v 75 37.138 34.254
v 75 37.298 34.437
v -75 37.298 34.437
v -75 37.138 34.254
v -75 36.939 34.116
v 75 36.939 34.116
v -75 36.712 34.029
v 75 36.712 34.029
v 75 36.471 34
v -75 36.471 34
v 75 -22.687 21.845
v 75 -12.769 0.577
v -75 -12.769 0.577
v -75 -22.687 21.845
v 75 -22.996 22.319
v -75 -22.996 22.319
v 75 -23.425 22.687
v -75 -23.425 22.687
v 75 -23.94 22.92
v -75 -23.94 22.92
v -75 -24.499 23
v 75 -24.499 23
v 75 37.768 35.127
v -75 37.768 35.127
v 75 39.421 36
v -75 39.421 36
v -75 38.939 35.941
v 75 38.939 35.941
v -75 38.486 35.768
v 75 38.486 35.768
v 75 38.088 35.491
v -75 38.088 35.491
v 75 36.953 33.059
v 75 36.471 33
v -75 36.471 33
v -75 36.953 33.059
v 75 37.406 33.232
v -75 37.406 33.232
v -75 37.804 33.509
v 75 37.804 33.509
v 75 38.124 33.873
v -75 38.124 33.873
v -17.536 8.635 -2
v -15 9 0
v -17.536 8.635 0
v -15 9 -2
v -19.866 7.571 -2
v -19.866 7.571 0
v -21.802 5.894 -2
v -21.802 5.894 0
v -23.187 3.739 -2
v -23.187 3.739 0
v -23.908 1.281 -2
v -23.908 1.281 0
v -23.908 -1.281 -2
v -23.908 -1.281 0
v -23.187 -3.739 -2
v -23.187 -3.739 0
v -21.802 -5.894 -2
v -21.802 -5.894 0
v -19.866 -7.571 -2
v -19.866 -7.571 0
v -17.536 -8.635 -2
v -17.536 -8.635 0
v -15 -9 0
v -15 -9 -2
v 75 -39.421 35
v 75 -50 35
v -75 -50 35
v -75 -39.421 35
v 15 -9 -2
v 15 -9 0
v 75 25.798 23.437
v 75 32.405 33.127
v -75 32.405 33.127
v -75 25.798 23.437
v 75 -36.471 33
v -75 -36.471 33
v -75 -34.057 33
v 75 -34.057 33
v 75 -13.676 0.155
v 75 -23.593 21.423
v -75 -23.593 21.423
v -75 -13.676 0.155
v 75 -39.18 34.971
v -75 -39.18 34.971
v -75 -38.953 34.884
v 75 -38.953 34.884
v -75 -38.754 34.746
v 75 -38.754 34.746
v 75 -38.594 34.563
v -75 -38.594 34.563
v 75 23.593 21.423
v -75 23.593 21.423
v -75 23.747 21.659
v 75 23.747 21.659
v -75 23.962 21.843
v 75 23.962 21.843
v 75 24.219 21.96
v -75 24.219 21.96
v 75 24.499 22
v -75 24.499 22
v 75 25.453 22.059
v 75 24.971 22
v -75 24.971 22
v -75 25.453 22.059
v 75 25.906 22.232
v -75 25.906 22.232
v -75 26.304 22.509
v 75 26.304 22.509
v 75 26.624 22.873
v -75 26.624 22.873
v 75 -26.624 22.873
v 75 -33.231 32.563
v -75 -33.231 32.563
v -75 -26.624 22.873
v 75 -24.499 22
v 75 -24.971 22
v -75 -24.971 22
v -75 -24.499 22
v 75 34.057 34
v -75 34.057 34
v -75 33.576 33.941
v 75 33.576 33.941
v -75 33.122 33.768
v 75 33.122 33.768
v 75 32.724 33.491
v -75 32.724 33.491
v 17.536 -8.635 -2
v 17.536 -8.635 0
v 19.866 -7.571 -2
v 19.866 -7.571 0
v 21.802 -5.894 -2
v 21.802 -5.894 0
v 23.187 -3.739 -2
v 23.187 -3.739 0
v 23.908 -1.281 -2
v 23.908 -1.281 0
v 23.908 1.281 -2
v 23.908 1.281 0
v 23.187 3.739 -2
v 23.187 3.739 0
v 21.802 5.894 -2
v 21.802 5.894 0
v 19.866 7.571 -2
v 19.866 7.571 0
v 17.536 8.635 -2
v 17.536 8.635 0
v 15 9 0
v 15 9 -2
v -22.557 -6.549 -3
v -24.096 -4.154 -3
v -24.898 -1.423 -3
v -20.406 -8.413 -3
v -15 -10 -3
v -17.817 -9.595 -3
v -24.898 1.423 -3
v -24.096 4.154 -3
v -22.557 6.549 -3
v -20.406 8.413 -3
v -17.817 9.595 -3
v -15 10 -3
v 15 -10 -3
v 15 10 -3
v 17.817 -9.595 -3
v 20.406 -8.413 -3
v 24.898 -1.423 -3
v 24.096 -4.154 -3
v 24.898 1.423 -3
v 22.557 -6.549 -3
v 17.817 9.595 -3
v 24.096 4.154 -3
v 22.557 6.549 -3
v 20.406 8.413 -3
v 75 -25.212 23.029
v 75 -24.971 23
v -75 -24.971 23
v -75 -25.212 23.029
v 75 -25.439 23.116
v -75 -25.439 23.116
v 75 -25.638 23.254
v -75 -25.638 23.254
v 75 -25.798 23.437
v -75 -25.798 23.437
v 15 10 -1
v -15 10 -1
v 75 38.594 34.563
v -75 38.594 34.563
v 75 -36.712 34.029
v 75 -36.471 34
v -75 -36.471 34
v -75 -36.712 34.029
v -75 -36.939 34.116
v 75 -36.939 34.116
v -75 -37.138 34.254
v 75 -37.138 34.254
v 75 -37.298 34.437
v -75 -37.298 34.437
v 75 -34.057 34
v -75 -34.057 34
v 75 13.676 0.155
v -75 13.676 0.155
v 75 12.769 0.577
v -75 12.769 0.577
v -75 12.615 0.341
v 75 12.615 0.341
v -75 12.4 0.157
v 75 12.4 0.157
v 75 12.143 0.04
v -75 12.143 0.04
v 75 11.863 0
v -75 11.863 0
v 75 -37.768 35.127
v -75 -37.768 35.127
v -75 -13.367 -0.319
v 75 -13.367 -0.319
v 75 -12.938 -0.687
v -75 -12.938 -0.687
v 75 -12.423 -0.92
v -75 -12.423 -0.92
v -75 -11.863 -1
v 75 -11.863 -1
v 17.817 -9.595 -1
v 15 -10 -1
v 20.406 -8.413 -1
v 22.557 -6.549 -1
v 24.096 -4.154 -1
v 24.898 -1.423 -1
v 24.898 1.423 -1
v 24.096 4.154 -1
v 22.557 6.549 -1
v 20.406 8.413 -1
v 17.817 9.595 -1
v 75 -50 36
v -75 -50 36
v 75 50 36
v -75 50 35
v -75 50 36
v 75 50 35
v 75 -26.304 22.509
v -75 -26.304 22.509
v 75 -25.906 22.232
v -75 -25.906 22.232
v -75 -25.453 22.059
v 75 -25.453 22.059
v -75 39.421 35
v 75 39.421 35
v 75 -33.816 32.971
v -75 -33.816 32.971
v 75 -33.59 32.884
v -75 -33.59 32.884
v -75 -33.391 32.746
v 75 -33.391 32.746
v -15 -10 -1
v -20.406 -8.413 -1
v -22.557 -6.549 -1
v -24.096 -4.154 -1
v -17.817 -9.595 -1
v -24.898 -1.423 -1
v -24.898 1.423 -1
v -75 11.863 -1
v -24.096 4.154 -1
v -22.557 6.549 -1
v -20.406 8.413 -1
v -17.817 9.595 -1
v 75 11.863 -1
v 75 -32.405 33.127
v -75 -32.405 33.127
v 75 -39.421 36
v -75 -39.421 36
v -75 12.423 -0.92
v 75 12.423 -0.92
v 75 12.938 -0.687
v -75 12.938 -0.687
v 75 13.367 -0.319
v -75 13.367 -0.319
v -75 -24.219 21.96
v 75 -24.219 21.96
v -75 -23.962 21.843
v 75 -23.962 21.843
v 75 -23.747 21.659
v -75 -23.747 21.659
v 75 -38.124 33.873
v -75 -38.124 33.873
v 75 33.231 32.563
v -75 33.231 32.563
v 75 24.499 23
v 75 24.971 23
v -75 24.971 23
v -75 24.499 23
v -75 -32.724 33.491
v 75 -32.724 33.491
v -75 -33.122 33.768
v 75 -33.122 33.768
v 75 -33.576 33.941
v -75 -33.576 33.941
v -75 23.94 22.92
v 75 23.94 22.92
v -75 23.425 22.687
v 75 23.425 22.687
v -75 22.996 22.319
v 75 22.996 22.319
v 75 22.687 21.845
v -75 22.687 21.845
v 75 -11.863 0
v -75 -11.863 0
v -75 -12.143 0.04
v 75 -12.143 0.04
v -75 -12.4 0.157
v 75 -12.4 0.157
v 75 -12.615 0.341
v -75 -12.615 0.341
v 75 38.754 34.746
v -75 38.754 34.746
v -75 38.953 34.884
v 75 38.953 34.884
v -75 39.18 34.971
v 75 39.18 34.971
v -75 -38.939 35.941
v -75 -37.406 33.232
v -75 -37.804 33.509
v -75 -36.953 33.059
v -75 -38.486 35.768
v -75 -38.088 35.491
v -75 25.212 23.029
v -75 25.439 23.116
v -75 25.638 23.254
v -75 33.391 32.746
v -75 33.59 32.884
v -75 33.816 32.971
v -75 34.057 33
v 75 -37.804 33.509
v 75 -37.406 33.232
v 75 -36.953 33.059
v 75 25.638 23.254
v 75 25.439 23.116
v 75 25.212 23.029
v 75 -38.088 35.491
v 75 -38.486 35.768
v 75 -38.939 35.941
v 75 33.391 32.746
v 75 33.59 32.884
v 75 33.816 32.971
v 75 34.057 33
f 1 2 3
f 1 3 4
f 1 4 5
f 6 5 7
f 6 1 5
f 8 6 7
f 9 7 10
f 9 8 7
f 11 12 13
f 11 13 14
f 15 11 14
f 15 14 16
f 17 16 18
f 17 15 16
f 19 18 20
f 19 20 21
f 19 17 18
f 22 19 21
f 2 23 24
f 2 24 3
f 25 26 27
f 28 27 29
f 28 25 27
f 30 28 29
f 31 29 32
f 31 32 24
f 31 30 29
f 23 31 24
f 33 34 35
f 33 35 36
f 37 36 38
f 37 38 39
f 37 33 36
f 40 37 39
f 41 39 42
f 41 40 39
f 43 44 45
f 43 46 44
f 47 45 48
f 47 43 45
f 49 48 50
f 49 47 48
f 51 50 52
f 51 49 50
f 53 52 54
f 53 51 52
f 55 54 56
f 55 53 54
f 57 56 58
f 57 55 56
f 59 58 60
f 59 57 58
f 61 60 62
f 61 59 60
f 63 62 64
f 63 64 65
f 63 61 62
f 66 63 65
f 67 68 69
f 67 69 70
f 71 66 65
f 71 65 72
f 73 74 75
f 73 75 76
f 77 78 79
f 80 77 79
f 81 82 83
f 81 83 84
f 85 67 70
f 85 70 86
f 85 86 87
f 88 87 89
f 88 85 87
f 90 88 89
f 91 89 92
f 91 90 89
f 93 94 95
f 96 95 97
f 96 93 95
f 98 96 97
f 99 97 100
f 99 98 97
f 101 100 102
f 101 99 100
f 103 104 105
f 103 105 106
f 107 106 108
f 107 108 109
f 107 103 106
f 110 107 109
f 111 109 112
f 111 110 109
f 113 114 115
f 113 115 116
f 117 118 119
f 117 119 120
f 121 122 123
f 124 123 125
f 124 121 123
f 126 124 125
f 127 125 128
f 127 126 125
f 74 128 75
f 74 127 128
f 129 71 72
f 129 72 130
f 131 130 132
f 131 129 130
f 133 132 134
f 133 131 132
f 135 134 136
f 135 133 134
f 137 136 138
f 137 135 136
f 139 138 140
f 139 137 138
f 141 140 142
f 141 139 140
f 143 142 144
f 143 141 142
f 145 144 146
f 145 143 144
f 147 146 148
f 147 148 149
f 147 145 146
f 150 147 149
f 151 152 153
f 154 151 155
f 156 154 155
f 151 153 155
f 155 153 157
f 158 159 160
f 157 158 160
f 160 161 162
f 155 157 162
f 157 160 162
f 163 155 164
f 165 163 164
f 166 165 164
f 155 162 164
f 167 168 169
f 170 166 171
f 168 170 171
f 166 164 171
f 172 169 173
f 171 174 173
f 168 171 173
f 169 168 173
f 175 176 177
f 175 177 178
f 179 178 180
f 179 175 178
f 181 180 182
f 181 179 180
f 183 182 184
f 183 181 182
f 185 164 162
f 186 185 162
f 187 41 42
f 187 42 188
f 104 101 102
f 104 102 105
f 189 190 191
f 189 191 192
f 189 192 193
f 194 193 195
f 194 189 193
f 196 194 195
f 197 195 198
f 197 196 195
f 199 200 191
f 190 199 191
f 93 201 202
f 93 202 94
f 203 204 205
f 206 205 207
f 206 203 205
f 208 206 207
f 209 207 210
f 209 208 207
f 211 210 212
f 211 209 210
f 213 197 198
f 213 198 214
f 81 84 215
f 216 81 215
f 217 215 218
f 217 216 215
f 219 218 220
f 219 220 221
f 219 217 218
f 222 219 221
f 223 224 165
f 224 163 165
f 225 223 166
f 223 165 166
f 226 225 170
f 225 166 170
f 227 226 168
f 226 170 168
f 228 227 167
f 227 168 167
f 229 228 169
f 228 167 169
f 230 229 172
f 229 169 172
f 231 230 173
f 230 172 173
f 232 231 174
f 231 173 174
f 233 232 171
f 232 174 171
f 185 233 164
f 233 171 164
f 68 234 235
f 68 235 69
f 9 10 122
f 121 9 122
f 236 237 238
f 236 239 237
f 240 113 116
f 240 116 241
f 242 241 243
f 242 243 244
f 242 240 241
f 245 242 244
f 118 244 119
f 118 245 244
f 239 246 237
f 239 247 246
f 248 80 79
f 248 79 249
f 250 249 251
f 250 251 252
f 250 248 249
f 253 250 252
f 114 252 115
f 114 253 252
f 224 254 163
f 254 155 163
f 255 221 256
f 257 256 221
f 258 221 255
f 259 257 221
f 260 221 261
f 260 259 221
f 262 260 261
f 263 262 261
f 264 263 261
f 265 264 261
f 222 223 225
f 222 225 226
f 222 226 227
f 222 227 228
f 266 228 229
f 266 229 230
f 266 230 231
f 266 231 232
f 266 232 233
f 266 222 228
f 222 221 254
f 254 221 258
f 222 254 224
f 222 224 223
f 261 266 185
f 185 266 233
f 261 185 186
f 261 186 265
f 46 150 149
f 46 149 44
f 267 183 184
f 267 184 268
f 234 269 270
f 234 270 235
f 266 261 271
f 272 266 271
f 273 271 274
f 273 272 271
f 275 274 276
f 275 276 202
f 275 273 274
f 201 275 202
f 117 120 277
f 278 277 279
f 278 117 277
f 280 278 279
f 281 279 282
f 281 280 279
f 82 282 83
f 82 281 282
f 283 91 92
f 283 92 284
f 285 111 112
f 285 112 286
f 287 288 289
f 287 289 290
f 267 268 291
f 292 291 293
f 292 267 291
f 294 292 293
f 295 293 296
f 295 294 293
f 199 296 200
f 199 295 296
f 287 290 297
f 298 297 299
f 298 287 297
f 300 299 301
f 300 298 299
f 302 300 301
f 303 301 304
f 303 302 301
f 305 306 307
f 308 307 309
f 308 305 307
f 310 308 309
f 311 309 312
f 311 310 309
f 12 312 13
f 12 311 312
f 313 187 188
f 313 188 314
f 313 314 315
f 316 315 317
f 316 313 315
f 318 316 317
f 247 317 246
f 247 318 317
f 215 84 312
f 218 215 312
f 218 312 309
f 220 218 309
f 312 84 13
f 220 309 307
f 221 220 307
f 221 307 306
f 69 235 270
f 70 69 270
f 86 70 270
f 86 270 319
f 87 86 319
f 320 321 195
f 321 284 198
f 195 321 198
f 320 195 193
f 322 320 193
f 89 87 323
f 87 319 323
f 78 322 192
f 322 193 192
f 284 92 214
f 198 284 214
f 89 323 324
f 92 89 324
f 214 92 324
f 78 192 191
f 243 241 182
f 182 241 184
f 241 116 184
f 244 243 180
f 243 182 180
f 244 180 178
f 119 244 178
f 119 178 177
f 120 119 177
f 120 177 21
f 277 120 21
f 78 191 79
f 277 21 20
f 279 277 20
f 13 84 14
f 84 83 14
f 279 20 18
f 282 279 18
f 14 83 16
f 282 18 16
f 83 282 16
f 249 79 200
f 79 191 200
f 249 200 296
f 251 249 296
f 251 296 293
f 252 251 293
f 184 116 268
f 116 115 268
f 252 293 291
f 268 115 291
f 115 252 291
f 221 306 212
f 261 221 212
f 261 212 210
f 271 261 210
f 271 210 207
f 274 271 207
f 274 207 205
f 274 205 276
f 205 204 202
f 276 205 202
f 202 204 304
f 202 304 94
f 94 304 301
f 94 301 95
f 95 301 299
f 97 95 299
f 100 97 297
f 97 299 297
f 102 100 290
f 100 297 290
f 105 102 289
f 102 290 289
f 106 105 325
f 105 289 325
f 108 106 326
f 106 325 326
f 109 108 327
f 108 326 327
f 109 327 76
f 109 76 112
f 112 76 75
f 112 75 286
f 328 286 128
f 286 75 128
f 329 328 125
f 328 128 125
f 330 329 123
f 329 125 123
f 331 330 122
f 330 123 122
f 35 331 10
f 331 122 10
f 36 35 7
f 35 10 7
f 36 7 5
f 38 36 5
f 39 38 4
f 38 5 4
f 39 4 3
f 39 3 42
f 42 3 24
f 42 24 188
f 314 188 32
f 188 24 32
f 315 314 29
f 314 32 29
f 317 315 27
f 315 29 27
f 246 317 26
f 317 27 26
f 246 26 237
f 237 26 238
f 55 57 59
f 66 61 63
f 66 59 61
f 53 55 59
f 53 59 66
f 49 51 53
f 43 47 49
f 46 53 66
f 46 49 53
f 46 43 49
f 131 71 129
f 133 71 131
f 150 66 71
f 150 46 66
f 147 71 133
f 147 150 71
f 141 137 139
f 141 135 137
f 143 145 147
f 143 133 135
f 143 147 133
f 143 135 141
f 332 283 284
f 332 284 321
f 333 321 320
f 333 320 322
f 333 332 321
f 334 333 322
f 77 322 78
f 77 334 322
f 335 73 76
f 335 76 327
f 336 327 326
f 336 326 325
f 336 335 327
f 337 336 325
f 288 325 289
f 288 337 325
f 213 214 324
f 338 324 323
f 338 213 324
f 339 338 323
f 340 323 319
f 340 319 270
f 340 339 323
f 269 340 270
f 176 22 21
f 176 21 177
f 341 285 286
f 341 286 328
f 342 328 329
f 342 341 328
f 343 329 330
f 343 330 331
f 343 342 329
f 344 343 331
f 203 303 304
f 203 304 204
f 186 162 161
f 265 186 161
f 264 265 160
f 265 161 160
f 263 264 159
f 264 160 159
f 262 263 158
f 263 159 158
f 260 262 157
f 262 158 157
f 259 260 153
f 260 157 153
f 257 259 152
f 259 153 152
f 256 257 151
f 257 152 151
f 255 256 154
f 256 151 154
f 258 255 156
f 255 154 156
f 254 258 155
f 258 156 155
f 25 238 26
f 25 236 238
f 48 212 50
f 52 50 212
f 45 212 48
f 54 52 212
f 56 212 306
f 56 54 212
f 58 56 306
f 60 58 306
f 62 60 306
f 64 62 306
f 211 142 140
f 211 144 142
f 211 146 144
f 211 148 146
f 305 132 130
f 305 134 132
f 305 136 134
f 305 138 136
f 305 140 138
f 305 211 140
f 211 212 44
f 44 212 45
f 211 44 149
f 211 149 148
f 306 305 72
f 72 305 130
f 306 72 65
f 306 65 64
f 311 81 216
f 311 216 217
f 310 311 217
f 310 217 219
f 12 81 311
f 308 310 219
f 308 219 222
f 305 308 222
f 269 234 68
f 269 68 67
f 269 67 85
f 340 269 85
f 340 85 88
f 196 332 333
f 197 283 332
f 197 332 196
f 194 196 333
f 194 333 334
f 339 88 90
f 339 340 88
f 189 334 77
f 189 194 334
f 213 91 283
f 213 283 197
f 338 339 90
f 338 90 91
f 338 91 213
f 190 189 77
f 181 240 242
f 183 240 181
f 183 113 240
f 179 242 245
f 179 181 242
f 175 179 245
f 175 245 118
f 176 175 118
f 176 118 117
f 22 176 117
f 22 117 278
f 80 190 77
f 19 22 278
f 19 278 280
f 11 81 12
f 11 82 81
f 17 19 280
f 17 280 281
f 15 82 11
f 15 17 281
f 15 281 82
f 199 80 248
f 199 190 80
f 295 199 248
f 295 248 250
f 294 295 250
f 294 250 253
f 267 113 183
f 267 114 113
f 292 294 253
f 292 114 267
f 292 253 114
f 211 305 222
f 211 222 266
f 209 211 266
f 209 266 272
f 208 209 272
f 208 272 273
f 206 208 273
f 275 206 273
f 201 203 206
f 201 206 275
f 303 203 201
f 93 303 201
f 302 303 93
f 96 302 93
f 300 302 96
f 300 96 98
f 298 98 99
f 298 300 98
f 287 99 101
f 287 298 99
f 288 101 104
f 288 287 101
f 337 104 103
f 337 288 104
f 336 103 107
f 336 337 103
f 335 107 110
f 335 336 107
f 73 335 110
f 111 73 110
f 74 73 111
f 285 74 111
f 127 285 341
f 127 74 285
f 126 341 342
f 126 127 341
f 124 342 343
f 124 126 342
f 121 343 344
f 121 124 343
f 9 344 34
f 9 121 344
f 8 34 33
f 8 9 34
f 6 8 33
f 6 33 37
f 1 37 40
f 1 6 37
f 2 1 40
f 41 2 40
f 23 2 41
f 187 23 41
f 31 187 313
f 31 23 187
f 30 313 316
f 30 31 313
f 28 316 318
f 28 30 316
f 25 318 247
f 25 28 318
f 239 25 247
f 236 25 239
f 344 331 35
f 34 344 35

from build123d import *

# Parameters (mm, degrees)
BASE_FLANGE1_DEPTH         = 75
SHEET_START                = -1
SHEET_METAL_STAMP1_DEPTH   = 1
SHEET_START_2              = -3
SHEET_METAL_STAMP1_2_DEPTH = 1
SHEET_START_3              = -2
SHEET_METAL_STAMP1_3_DEPTH = 1


# Read off the part's stored shape, not the designer's step: Sheet Metal Stamp1
# Sheet-metal steps are written as plain solids
with BuildPart() as part:
    # Sketch1 → Base-Flange1 (new, symmetric)
    with BuildSketch(Plane.YZ):
        with BuildLine():
            Line((50, 36), (39.420641265, 36))
            ThreePointArc((39.420641265, 36), (38.486121949, 35.768240269), (37.768186579, 35.126673649))
            Line((37.768186579, 35.126673649), (37.297724892, 34.436663175))
            ThreePointArc((37.297724892, 34.436663175), (36.938757207, 34.115879865), (36.471497549, 34))
            Line((36.471497549, 34), (34.057004901, 34))
            ThreePointArc((34.057004901, 34), (33.122485586, 33.768240269), (32.404550215, 33.126673649))
            Line((32.404550215, 33.126673649), (25.797724892, 23.436663175))
            ThreePointArc((25.797724892, 23.436663175), (25.438757207, 23.115879865), (24.971497549, 23))
            Line((24.971497549, 23), (24.499216659, 23))
            ThreePointArc((24.499216659, 23), (23.424617442, 22.686782892), (22.686601085, 21.845236523))
            Line((22.686601085, 21.845236523), (12.769237526, 0.577381738))
            ThreePointArc((12.769237526, 0.577381738), (12.400229348, 0.156608554), (11.862929739, 0))
            Line((11.862929739, 0), (-11.862929739, 0))
            ThreePointArc((-11.862929739, 0), (-12.400229348, 0.156608554), (-12.769237526, 0.577381738))
            Line((-12.769237526, 0.577381738), (-22.686601085, 21.845236523))
            ThreePointArc((-22.686601085, 21.845236523), (-23.424617442, 22.686782892), (-24.499216659, 23))
            Line((-24.499216659, 23), (-24.971497549, 23))
            ThreePointArc((-24.971497549, 23), (-25.438757207, 23.115879865), (-25.797724892, 23.436663175))
            Line((-25.797724892, 23.436663175), (-32.404550215, 33.126673649))
            ThreePointArc((-32.404550215, 33.126673649), (-33.122485586, 33.768240269), (-34.057004901, 34))
            Line((-34.057004901, 34), (-36.471497549, 34))
            ThreePointArc((-36.471497549, 34), (-36.938757207, 34.115879865), (-37.297724892, 34.436663175))
            Line((-37.297724892, 34.436663175), (-37.768186579, 35.126673649))
            ThreePointArc((-37.768186579, 35.126673649), (-38.486121949, 35.768240269), (-39.420641265, 36))
            Line((-39.420641265, 36), (-50, 36))
            Line((-50, 36), (-50, 35))
            Line((-50, 35), (-39.420641265, 35))
            ThreePointArc((-39.420641265, 35), (-38.953381607, 34.884120135), (-38.594413922, 34.563336825))
            Line((-38.594413922, 34.563336825), (-38.123952235, 33.873326351))
            ThreePointArc((-38.123952235, 33.873326351), (-37.406016865, 33.231759731), (-36.471497549, 33))
            Line((-36.471497549, 33), (-34.057004901, 33))
            ThreePointArc((-34.057004901, 33), (-33.589745243, 32.884120135), (-33.230777558, 32.563336825))
            Line((-33.230777558, 32.563336825), (-26.623952235, 22.873326351))
            ThreePointArc((-26.623952235, 22.873326351), (-25.906016865, 22.231759731), (-24.971497549, 22))
            Line((-24.971497549, 22), (-24.499216659, 22))
            ThreePointArc((-24.499216659, 22), (-23.961917051, 21.843391446), (-23.592908872, 21.422618262))
            Line((-23.592908872, 21.422618262), (-13.675545313, 0.154763477))
            ThreePointArc((-13.675545313, 0.154763477), (-12.937528956, -0.686782892), (-11.862929739, -1))
            Line((-11.862929739, -1), (11.862929739, -1))
            ThreePointArc((11.862929739, -1), (12.937528956, -0.686782892), (13.675545313, 0.154763477))
            Line((13.675545313, 0.154763477), (23.592908872, 21.422618262))
            ThreePointArc((23.592908872, 21.422618262), (23.961917051, 21.843391446), (24.499216659, 22))
            Line((24.499216659, 22), (24.971497549, 22))
            ThreePointArc((24.971497549, 22), (25.906016865, 22.231759731), (26.623952235, 22.873326351))
            Line((26.623952235, 22.873326351), (33.230777558, 32.563336825))
            ThreePointArc((33.230777558, 32.563336825), (33.589745243, 32.884120135), (34.057004901, 33))
            Line((34.057004901, 33), (36.471497549, 33))
            ThreePointArc((36.471497549, 33), (37.406016865, 33.231759731), (38.123952235, 33.873326351))
            Line((38.123952235, 33.873326351), (38.594413922, 34.563336825))
            ThreePointArc((38.594413922, 34.563336825), (38.953381607, 34.884120135), (39.420641265, 35))
            Line((39.420641265, 35), (50, 35))
            Line((50, 35), (50, 36))
        make_face()
    extrude(amount=BASE_FLANGE1_DEPTH, both=True)

    # Sheet Metal Stamp1 outline → Sheet Metal Stamp1 (cut)
    with BuildSketch(Plane.XY.offset(SHEET_START)):
        with BuildLine():
            ThreePointArc((-15, 9), (-24, 0), (-15, -9))
            Line((-15, -9), (15, -9))
            ThreePointArc((15, -9), (24, 0), (15, 9))
            Line((15, 9), (-15, 9))
        make_face()
    extrude(amount=SHEET_METAL_STAMP1_DEPTH, mode=Mode.SUBTRACT)



with BuildPart() as body_2:
    # Sheet Metal Stamp1 2 outline → Sheet Metal Stamp1 2 (new body)
    with BuildSketch(Plane.XY.offset(SHEET_START_2)):
        with BuildLine():
            ThreePointArc((-15, 10), (-25, 0), (-15, -10))
            Line((-15, -10), (15, -10))
            ThreePointArc((15, -10), (25, 0), (15, 10))
            Line((15, 10), (-15, 10))
        make_face()
    extrude(amount=SHEET_METAL_STAMP1_2_DEPTH)


with BuildPart() as part_1:
    add(part.part)

    add(body_2.part)  # Sheet Metal Stamp1 3 merges body 2
    # Sheet Metal Stamp1 3 outline → Sheet Metal Stamp1 3 (add)
    with BuildSketch(Plane.XY.offset(SHEET_START_3)):
        with BuildLine():
            ThreePointArc((-15, 10), (-25, 0), (-15, -10))
            Line((-15, -10), (15, -10))
            ThreePointArc((15, -10), (25, 0), (15, 10))
            Line((15, 10), (-15, 10))
        make_face()
        with BuildLine():
            Line((15, -9), (-15, -9))
            ThreePointArc((-15, -9), (-24, 0), (-15, 9))
            Line((-15, 9), (15, 9))
            ThreePointArc((15, 9), (24, 0), (15, -9))
        make_face(mode=Mode.SUBTRACT)
    extrude(amount=SHEET_METAL_STAMP1_3_DEPTH)


solid = part_1.part
